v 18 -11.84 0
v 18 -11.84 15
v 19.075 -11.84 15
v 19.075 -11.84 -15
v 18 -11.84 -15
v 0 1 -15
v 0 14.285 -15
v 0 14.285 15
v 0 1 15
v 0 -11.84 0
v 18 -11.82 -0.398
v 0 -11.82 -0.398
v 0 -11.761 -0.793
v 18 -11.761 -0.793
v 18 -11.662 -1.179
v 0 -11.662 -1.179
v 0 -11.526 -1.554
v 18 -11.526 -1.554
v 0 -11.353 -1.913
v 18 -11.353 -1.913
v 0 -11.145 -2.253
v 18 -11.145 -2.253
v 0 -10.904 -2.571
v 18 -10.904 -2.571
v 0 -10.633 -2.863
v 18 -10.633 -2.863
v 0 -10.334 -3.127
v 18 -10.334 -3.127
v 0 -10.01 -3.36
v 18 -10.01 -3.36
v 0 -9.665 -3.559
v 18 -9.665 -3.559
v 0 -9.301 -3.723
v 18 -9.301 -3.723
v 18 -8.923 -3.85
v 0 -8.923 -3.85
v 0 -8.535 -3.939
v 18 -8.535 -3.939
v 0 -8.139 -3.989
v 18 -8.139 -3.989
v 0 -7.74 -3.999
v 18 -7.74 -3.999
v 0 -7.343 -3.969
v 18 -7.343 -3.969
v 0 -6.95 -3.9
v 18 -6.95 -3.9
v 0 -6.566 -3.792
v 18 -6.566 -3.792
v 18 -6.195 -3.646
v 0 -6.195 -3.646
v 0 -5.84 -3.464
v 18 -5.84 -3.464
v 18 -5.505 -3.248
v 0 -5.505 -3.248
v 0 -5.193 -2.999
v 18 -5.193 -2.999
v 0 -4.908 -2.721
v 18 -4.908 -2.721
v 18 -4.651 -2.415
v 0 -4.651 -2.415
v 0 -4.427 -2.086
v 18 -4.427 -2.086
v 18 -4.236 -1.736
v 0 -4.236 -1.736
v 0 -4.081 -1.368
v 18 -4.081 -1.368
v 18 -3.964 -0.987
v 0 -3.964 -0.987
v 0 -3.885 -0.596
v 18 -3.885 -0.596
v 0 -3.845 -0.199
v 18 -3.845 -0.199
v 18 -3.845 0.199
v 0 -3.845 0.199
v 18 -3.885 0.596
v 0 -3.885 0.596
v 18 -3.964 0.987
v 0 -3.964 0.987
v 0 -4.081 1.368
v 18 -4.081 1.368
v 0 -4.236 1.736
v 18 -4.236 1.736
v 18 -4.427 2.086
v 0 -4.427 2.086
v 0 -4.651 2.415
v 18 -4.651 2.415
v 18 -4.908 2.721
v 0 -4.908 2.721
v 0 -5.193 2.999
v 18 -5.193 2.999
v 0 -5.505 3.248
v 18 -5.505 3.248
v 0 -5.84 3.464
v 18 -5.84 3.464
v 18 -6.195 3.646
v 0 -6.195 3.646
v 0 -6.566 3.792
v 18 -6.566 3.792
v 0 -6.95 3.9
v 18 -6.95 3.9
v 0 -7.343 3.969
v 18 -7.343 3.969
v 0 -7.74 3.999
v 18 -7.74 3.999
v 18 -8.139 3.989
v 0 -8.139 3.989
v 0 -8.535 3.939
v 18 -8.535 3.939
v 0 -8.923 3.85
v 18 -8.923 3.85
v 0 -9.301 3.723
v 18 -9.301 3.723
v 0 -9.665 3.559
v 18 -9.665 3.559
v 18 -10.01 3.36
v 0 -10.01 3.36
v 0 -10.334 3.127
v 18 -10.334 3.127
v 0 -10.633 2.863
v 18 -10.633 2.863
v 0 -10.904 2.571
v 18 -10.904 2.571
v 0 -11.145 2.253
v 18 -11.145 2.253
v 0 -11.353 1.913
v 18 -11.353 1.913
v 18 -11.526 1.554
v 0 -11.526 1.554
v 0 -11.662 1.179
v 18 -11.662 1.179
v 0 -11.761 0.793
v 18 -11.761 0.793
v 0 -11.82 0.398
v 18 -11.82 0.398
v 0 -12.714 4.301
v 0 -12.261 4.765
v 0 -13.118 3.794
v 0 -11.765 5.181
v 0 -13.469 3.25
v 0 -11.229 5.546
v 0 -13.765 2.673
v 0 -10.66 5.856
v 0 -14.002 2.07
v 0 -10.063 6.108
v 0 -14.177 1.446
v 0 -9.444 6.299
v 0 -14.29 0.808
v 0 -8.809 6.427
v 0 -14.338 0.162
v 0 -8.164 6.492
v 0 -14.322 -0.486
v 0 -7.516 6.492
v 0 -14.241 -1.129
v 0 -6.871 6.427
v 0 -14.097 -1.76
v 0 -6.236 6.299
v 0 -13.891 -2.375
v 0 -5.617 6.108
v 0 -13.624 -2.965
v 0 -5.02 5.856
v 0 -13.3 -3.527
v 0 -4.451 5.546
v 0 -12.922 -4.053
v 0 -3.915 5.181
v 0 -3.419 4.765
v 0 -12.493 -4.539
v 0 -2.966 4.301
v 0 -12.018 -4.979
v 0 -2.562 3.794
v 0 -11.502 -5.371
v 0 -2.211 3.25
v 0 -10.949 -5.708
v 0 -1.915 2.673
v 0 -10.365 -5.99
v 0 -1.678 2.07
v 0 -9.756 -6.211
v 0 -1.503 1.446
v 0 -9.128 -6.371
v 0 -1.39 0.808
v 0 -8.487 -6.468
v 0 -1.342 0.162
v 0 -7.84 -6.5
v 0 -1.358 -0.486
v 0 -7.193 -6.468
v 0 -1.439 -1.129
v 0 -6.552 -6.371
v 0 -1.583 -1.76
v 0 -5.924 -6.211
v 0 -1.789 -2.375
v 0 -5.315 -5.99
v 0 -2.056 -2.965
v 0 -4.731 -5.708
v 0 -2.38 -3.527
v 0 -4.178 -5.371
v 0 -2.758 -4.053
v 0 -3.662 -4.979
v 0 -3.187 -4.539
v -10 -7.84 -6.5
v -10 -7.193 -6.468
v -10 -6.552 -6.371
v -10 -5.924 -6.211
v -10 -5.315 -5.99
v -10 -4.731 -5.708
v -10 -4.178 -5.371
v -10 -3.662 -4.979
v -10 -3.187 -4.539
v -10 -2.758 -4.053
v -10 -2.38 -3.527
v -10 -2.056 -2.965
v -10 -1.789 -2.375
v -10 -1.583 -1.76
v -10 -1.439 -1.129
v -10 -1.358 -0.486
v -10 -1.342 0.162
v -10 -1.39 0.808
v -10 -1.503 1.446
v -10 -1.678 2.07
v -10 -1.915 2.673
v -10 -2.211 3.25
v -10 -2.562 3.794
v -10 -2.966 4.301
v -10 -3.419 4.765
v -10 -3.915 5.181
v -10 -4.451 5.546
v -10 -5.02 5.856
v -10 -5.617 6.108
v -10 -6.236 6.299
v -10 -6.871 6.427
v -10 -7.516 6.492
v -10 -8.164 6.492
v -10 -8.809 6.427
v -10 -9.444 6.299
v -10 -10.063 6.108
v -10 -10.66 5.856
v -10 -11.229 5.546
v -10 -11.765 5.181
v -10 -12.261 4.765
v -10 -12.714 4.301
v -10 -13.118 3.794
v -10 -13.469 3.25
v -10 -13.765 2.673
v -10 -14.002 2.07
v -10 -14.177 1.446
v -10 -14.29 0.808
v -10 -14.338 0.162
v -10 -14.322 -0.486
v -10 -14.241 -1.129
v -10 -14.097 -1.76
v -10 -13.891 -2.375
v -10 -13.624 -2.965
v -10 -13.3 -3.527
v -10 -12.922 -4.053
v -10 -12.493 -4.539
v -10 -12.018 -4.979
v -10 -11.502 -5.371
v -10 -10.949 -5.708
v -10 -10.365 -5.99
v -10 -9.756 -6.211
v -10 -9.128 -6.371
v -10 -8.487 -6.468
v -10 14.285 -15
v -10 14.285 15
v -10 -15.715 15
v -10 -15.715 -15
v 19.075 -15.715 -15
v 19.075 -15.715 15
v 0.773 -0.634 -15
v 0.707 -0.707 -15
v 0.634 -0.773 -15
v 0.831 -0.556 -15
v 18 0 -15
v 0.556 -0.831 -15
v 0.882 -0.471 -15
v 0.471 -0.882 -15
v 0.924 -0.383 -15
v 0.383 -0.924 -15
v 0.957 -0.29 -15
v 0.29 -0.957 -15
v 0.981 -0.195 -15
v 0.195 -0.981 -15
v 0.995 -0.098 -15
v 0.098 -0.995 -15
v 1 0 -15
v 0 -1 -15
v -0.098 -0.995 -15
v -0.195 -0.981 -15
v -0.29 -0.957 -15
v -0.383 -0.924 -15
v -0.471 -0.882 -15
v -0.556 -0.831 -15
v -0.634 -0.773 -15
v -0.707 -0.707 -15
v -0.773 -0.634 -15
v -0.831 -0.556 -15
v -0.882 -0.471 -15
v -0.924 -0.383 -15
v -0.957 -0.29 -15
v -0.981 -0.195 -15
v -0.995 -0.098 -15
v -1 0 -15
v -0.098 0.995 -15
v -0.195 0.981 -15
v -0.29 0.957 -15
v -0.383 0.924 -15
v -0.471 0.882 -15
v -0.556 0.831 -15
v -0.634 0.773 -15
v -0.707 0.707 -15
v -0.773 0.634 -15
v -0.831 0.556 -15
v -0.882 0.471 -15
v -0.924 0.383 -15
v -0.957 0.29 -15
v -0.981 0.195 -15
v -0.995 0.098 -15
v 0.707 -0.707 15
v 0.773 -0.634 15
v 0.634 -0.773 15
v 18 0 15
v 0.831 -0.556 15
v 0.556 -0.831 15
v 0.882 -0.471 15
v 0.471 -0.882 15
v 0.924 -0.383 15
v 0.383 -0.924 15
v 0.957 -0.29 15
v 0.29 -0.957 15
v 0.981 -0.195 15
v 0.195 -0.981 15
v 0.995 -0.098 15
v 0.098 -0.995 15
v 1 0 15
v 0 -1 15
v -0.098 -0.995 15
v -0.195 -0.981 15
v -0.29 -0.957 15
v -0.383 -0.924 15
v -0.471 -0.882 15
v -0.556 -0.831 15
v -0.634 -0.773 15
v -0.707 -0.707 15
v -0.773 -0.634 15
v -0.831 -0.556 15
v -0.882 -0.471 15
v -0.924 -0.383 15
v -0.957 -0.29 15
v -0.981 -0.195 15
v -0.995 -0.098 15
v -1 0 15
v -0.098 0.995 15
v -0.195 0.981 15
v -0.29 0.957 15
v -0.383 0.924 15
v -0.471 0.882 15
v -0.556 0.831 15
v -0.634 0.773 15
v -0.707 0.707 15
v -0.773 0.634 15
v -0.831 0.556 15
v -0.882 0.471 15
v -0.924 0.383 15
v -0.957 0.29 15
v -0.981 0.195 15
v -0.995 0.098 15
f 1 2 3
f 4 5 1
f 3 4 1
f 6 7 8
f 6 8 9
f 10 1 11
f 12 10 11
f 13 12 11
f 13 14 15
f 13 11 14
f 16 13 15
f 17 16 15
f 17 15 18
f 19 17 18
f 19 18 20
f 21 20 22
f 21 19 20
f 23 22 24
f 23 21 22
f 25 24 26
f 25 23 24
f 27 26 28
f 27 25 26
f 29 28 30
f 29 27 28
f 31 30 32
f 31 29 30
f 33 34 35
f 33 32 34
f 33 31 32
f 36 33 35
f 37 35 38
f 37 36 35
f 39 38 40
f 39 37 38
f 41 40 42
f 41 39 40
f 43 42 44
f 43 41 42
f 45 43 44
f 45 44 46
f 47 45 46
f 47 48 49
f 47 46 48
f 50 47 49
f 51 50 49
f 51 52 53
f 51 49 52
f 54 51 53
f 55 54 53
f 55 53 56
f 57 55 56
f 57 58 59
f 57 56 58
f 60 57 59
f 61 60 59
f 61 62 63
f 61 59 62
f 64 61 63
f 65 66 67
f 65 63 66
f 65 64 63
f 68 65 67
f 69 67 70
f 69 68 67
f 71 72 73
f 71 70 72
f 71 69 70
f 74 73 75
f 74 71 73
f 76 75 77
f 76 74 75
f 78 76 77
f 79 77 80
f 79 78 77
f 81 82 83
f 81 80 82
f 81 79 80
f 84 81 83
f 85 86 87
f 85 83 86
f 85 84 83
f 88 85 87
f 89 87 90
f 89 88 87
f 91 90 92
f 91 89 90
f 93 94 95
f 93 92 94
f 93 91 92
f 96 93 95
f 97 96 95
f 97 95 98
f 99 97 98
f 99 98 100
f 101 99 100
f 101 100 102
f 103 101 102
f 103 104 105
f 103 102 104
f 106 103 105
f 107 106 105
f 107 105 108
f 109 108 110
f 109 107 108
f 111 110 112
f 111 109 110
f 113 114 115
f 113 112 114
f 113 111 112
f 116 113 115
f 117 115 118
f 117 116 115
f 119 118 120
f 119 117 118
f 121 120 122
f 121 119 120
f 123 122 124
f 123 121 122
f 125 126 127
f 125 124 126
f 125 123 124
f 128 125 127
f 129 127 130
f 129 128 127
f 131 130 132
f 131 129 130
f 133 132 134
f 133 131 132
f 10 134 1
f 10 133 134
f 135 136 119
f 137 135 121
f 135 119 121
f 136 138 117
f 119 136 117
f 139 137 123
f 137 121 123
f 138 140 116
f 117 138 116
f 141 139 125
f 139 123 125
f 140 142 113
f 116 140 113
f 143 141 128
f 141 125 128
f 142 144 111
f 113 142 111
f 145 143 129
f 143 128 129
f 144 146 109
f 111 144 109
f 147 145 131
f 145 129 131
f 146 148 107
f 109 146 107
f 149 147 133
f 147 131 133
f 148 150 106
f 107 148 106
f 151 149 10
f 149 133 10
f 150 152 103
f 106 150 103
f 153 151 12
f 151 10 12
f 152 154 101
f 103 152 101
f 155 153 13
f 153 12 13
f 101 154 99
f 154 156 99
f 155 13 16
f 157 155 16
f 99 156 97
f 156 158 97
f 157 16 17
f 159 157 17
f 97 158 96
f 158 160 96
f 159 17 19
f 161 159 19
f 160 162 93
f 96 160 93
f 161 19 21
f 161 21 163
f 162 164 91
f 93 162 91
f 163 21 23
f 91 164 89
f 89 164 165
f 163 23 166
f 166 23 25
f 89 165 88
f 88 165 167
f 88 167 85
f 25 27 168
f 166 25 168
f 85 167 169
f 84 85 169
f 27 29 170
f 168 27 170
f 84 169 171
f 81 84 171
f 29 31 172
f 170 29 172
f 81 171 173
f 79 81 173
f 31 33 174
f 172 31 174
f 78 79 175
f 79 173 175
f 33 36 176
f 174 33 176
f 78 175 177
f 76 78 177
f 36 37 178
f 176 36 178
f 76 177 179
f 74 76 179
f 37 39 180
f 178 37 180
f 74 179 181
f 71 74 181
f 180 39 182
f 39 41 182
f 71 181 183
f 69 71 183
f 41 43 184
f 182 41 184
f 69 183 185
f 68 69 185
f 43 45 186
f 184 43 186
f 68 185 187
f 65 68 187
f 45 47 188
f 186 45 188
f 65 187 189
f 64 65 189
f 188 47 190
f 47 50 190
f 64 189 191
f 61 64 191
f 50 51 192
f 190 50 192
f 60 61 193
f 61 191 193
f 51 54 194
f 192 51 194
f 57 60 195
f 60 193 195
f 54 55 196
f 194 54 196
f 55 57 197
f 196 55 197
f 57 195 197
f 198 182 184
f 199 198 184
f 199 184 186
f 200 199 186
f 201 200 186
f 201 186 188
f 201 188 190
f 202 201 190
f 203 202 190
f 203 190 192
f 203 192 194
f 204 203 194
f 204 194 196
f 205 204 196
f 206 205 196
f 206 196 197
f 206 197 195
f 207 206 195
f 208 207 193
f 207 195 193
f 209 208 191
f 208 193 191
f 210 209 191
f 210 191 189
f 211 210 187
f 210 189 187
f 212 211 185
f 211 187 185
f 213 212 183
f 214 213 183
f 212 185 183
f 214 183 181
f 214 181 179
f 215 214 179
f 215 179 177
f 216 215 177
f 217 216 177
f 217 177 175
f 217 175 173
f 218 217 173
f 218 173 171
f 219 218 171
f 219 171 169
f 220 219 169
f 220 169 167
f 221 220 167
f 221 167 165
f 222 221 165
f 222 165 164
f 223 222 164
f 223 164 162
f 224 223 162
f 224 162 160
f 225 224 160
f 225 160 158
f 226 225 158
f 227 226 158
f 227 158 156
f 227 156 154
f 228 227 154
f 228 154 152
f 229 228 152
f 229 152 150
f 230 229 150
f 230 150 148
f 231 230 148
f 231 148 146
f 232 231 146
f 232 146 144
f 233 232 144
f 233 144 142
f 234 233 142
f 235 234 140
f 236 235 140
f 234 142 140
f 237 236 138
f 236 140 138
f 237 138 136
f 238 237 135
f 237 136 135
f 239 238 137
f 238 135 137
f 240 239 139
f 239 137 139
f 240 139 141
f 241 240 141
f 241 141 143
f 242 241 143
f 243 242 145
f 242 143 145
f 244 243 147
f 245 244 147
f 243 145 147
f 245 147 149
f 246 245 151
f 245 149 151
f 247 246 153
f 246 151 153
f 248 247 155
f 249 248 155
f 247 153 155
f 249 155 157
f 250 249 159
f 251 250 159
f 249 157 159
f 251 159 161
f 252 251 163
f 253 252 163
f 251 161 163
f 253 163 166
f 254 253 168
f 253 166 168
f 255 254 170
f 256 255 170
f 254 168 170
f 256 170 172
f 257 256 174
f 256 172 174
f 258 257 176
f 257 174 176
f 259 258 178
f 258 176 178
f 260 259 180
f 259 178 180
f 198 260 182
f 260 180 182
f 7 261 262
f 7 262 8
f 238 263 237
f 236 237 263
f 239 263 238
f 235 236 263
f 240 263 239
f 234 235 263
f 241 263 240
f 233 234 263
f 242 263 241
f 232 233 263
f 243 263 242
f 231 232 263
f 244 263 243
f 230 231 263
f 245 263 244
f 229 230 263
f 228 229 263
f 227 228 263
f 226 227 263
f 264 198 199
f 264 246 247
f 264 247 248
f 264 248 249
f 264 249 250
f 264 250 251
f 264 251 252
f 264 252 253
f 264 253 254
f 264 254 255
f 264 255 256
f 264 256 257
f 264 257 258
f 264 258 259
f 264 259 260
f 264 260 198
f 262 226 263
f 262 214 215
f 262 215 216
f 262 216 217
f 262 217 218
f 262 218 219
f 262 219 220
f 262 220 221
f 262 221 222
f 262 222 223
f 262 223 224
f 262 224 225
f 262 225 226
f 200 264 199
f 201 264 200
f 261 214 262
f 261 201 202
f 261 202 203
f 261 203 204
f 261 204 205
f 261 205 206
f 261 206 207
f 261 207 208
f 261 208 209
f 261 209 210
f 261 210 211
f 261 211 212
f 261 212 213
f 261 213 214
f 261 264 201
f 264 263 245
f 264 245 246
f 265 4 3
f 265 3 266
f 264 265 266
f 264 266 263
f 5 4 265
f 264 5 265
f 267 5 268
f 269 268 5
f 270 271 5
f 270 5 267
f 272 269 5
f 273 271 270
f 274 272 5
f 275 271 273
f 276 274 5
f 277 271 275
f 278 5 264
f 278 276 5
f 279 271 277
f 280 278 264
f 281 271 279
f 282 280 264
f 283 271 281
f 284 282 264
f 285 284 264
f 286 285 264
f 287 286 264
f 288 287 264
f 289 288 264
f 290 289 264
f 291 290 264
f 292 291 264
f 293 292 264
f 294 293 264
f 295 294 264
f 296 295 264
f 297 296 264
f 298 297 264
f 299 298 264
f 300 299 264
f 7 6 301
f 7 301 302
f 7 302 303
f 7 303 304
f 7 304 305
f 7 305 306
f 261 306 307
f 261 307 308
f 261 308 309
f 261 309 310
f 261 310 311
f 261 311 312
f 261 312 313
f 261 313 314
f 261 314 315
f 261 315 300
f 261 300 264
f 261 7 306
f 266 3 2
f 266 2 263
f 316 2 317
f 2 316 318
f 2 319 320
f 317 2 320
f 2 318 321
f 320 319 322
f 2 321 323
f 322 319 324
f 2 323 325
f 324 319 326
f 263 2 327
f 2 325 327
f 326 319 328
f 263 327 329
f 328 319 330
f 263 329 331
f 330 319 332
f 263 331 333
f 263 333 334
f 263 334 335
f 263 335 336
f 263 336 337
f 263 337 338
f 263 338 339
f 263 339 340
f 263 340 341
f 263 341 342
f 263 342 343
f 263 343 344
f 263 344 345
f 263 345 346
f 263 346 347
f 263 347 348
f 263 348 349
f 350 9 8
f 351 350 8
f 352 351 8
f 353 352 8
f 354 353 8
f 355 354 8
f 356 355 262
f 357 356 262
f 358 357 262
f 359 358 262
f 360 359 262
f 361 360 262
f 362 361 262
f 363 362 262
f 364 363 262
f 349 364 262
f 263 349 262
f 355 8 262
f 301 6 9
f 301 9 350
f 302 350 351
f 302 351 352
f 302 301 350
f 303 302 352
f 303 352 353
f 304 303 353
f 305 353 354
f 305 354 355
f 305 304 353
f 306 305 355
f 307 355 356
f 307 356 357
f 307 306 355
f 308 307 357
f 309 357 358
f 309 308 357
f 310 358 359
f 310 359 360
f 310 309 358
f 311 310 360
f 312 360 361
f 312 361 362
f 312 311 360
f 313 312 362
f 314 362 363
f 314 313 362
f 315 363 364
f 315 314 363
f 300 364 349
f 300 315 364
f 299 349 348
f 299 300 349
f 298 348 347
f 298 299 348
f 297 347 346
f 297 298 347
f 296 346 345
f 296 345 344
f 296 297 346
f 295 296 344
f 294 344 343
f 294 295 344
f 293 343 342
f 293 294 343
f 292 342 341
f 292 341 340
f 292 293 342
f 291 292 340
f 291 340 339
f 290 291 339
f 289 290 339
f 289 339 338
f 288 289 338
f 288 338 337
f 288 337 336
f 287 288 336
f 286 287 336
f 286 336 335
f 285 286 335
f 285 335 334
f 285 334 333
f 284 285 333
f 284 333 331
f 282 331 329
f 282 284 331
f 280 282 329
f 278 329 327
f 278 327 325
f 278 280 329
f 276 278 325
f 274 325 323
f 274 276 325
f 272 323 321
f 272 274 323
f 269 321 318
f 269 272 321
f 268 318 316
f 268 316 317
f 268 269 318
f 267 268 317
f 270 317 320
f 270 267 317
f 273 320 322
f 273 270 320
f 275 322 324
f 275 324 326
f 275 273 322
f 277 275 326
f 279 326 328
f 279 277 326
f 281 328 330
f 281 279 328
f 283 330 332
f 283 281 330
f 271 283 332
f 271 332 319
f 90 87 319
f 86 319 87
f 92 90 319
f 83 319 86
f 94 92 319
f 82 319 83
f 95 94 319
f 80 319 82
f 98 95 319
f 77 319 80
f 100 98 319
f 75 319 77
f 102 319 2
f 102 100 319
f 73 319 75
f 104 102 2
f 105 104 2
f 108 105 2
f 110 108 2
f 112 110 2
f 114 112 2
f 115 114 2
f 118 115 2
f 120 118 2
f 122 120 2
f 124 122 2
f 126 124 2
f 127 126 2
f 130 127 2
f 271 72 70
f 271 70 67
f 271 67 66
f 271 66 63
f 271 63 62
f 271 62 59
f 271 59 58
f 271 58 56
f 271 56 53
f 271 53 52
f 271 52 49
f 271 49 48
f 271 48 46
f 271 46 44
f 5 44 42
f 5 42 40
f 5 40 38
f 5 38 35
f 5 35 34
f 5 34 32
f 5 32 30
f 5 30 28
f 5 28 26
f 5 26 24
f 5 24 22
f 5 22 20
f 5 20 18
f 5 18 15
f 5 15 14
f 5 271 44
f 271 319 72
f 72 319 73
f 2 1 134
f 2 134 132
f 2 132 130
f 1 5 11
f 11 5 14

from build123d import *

# Parameters (mm, degrees)
BOSS_EXTRUDE1_DEPTH      = 15
BOSS_EXTRUDE1_DEPTH_BACK = 15
CUT_EXTRUDE1_DEPTH       = 55.4
CUT_EXTRUDE1_DEPTH_BACK  = 30
SKETCH2_R                = 4
SKETCH3_R                = 6.5
CUT_EXTRUDE2_DEPTH       = 18.2


with BuildPart() as part:
    # Sketch1 → Boss-Extrude1 (new, two sides: drawn at the far end of the back side and taken through both)
    with BuildSketch(Plane.XY.offset(-BOSS_EXTRUDE1_DEPTH_BACK)):
        with BuildLine():
            Line((-10, 14.285038976), (-10, -15.714961024))
            Line((-10, -15.714961024), (19.0754, -15.714961024))
            Line((19.0754, -15.714961024), (19.0754, -11.84))
            Line((19.0754, -11.84), (18, -11.84))
            Line((18, -11.84), (18, 0))
            Line((18, 0), (1, 0))
            ThreePointArc((1, 0), (-0.707106781, -0.707106781), (0, 1))
            Line((0, 1), (0, 14.285038976))
            Line((0, 14.285038976), (-10, 14.285038976))
        make_face()
    extrude(amount=BOSS_EXTRUDE1_DEPTH + BOSS_EXTRUDE1_DEPTH_BACK)

    # Sketch2 → Cut-Extrude1 (cut, two sides: drawn at the far end of the back side and taken through both)
    with BuildSketch(Plane(origin=(0, 0, 0), x_dir=(0, 0, -1), z_dir=(1, 0, 0)).offset(-CUT_EXTRUDE1_DEPTH_BACK)):
        with Locations((0, -7.84)):
            Circle(SKETCH2_R)
    extrude(amount=CUT_EXTRUDE1_DEPTH + CUT_EXTRUDE1_DEPTH_BACK, mode=Mode.SUBTRACT)

    # Sketch3 → Cut-Extrude2 (cut)
    with BuildSketch(Plane(origin=(0, 0, 0), x_dir=(0, 0, -1), z_dir=(1, 0, 0))):
        with Locations((0, -7.84)):
            Circle(SKETCH3_R)
    extrude(amount=-CUT_EXTRUDE2_DEPTH, mode=Mode.SUBTRACT)


solid = part.part
